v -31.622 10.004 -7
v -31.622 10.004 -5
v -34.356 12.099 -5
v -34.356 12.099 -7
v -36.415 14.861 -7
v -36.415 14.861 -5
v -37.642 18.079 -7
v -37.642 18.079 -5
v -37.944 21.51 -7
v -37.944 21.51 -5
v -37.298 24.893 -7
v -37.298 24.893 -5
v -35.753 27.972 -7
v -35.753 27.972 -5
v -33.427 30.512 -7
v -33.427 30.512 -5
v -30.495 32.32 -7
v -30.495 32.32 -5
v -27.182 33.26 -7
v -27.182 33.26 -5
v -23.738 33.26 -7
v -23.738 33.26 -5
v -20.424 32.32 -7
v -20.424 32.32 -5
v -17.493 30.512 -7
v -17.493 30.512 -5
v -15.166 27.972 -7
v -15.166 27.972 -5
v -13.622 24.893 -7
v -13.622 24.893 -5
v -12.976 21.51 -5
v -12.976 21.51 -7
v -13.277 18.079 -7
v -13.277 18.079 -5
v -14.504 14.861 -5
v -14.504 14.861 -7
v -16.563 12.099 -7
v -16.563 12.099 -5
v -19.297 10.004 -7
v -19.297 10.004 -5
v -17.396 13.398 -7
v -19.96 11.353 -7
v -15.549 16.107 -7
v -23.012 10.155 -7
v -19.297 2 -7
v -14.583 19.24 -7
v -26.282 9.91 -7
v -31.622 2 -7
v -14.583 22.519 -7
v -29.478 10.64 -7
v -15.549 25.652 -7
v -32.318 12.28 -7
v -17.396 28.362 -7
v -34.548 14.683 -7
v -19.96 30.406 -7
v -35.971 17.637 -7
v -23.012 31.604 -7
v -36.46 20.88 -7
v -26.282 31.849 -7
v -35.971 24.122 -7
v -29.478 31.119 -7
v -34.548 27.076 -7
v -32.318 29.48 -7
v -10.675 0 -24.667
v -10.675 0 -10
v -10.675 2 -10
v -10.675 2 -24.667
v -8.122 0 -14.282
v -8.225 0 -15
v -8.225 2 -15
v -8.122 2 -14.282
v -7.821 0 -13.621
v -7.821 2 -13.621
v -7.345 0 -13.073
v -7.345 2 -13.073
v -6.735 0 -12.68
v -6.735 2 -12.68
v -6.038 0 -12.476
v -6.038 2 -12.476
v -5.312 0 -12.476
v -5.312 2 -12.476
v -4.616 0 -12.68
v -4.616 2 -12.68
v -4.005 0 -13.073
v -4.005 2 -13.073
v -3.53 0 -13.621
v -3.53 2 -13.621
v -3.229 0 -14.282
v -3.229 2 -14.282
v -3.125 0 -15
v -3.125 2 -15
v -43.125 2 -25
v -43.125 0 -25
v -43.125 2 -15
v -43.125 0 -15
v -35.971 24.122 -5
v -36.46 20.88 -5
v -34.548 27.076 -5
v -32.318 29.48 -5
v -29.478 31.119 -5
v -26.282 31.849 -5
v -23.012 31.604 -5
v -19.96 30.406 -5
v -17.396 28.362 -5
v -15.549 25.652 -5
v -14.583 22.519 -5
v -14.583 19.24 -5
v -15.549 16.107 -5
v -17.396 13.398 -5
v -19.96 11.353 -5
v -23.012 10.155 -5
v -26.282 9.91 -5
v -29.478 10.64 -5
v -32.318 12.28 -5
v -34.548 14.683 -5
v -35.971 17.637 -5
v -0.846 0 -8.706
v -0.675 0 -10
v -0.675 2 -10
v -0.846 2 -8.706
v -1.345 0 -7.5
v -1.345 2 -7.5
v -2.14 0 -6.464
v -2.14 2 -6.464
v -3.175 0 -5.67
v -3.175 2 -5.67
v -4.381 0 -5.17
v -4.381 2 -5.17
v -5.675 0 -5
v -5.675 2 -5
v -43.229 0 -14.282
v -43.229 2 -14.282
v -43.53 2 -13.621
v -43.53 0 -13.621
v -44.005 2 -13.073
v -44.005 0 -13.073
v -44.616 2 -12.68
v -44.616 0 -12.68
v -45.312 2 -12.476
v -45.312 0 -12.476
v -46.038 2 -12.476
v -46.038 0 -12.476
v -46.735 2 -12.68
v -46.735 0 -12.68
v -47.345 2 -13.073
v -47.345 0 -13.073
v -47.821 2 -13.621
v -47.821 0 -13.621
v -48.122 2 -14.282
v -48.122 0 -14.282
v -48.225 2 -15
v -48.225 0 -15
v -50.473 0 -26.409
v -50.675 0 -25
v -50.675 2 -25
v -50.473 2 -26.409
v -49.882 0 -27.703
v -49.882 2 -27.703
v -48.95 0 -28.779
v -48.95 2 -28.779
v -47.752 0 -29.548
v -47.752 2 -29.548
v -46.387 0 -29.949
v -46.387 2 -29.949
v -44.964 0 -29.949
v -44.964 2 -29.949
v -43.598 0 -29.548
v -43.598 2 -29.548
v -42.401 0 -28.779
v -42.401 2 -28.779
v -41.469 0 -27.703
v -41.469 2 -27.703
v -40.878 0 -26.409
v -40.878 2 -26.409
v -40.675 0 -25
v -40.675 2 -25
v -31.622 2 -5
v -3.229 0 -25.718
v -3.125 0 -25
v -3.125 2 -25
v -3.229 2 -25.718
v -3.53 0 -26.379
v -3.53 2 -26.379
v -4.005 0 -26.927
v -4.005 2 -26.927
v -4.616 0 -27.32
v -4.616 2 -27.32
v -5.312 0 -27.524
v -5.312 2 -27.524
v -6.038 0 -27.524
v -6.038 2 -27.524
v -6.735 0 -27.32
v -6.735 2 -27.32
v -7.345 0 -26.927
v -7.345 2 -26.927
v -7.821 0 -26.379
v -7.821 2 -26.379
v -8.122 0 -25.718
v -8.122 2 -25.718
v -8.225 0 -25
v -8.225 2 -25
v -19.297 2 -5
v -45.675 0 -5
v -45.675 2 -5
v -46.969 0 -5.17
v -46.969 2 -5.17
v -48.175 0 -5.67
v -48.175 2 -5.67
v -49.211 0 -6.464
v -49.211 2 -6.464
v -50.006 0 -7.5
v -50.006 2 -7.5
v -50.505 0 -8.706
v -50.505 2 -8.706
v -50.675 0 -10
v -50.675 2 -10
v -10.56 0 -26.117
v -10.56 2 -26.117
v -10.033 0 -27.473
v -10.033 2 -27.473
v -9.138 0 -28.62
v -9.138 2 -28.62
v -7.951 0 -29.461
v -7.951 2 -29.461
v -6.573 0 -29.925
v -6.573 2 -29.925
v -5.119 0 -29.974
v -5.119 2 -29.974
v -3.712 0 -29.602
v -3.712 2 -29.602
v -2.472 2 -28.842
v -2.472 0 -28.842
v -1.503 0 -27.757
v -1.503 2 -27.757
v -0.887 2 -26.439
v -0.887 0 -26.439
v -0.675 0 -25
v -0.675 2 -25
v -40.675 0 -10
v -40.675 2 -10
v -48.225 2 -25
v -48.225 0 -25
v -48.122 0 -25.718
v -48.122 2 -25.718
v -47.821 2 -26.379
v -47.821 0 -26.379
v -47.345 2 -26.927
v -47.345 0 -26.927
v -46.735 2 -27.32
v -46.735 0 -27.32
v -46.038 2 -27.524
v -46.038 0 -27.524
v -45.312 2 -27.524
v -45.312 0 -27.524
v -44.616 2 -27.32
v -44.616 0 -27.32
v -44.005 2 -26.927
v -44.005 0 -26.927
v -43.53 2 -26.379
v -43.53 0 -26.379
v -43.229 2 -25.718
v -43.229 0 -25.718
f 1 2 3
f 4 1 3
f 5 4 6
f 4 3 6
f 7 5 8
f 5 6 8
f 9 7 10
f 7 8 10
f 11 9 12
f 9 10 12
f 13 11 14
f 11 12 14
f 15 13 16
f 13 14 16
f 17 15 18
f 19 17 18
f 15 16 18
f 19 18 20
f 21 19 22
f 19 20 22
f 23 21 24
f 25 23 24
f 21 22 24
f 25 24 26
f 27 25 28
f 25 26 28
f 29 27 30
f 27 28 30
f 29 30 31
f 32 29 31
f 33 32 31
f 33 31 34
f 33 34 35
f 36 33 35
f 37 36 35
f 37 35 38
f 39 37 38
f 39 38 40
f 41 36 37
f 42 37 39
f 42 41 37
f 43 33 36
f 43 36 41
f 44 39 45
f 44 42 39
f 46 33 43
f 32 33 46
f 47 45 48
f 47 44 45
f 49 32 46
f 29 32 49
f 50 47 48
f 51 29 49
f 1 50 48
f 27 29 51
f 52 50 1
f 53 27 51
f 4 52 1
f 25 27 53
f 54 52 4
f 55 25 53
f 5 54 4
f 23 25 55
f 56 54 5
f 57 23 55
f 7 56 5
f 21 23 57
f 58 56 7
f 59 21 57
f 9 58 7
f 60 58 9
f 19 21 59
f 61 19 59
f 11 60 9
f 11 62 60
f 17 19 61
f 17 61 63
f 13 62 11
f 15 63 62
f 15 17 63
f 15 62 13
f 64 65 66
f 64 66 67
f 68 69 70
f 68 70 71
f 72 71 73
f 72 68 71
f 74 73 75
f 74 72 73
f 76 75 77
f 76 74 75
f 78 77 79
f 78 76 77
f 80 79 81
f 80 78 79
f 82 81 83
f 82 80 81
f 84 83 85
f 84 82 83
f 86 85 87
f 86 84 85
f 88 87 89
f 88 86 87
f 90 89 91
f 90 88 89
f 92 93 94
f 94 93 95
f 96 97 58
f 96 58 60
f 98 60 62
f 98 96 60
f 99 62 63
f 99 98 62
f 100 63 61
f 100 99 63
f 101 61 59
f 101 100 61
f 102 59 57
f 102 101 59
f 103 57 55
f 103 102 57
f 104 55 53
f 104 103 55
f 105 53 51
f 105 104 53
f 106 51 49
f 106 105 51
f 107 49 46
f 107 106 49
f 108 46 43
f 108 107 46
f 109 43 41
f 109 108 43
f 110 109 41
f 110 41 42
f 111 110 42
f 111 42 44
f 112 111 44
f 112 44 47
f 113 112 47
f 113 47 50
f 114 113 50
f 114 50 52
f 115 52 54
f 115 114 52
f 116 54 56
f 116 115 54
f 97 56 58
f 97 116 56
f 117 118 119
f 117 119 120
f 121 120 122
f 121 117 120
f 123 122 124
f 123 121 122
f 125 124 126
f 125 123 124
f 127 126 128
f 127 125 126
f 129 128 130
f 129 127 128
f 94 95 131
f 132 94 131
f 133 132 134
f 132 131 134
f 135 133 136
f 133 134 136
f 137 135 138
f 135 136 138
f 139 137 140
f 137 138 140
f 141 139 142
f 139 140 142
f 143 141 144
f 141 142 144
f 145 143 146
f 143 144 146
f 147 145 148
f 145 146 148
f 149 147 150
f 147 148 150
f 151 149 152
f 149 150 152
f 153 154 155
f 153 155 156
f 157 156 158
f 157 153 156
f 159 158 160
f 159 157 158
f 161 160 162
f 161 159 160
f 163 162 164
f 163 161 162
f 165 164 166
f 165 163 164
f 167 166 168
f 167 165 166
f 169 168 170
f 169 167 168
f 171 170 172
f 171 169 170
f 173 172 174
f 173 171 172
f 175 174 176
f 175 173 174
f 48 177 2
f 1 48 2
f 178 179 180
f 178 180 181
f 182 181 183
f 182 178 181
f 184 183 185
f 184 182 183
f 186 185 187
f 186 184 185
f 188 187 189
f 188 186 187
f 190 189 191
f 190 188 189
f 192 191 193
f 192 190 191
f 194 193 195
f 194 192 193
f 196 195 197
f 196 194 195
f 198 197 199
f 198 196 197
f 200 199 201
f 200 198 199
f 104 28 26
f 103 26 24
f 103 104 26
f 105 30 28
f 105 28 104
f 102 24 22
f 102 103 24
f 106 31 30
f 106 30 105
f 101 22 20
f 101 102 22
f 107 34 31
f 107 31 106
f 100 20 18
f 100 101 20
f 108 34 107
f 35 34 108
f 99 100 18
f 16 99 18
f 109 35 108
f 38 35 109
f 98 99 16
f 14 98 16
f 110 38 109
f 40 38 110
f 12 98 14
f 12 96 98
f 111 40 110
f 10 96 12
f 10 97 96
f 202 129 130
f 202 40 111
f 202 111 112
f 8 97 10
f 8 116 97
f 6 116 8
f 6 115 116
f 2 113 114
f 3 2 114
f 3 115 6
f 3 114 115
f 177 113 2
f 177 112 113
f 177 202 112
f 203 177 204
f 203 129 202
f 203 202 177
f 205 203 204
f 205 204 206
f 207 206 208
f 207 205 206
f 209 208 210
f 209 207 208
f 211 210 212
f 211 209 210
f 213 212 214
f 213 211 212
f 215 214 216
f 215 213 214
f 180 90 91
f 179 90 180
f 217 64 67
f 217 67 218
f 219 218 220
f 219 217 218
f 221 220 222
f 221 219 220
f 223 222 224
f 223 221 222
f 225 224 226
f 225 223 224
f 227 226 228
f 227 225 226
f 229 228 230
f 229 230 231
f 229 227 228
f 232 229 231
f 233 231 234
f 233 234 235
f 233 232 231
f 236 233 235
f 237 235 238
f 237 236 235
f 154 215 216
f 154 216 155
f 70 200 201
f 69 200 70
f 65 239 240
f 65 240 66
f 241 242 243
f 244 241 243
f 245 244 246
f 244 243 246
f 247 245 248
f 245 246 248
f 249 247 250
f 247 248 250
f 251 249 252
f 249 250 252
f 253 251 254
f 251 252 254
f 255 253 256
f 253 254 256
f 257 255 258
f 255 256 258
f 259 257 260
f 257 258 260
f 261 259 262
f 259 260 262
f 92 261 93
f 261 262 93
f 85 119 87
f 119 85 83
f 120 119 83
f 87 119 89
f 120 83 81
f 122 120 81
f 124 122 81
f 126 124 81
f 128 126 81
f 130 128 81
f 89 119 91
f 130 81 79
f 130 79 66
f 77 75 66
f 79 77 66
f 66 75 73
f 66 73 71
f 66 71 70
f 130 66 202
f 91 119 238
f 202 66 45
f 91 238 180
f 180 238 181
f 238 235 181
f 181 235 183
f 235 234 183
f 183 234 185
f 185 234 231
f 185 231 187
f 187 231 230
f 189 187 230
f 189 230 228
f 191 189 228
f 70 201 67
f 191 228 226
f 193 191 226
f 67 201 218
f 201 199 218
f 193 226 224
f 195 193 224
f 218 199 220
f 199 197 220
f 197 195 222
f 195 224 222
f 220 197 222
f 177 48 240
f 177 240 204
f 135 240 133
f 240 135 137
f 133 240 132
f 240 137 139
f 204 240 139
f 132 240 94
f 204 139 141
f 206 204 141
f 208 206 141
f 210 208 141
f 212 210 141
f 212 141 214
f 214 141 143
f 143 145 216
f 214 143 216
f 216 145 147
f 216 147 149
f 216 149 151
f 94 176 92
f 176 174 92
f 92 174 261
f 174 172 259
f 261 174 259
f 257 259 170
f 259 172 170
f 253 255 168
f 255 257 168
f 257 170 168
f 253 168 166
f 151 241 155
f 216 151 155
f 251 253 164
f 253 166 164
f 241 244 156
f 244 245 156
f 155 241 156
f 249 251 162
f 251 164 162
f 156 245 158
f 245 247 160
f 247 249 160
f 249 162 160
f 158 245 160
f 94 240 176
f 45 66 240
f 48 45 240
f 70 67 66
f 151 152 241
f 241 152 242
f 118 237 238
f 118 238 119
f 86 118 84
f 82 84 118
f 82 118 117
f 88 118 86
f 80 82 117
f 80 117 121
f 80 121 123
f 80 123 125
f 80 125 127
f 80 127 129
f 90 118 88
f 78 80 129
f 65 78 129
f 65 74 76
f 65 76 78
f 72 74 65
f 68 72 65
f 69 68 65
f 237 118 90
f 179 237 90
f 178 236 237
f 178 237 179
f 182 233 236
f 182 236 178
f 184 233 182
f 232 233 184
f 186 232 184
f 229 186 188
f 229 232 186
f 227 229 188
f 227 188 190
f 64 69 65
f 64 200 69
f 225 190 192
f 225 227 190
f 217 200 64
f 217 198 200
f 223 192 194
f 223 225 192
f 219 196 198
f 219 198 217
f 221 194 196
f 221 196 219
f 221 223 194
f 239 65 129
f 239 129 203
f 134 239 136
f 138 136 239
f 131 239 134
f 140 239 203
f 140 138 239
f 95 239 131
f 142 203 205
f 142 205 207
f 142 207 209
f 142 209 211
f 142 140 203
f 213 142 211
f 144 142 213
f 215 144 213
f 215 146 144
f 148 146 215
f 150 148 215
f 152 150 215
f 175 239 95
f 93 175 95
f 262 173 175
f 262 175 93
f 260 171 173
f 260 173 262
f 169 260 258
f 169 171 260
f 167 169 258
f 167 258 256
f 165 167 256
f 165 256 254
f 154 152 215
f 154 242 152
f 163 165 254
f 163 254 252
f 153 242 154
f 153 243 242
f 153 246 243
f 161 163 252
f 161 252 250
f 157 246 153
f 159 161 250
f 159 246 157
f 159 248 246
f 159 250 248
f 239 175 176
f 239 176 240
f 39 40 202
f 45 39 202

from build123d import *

# Parameters (mm, degrees)
BOSS_EXTRUDE1_DEPTH = 2
SKETCH2_R           = 11
BOSS_EXTRUDE3_DEPTH = 2


with BuildPart() as part:
    # Sketch1 → Boss-Extrude1 (new body)
    with BuildSketch(Plane(origin=(0, 0, 0), x_dir=(1, 0, 0), z_dir=(0, 1, 0))):
        with BuildLine():
            Line((-50.675392178, 10), (-50.675392178, 25))
            ThreePointArc((-50.675392178, 25), (-45.675392178, 30), (-40.675392178, 25))
            Line((-40.675392178, 25), (-40.675392178, 10))
            Line((-40.675392178, 10), (-10.675392178, 10))
            Line((-10.675392178, 10), (-10.675392178, 24.667030171))
            ThreePointArc((-10.675392178, 24.667030171), (-5.847512802, 30.002770955), (-0.675392178, 25))
            Line((-0.675392178, 25), (-0.675392178, 10))
            ThreePointArc((-0.675392178, 10), (-2.139858272, 6.464466094), (-5.675392178, 5))
            Line((-5.675392178, 5), (-45.675392178, 5))
            ThreePointArc((-45.675392178, 5), (-49.210926084, 6.464466094), (-50.675392178, 10))
        make_face()
        with BuildLine():
            Line((-43.125392178, 25), (-43.125392178, 15))
            ThreePointArc((-43.125392178, 15), (-45.675392178, 12.45), (-48.225392178, 15))
            Line((-48.225392178, 15), (-48.225392178, 25))
            ThreePointArc((-48.225392178, 25), (-45.675392178, 27.55), (-43.125392178, 25))
        make_face(mode=Mode.SUBTRACT)
        with BuildLine():
            Line((-8.225392178, 25), (-8.225392178, 15))
            ThreePointArc((-8.225392178, 15), (-5.675392178, 12.45), (-3.125392178, 15))
            Line((-3.125392178, 15), (-3.125392178, 25))
            ThreePointArc((-3.125392178, 25), (-5.675392178, 27.55), (-8.225392178, 25))
        make_face(mode=Mode.SUBTRACT)
    extrude(amount=BOSS_EXTRUDE1_DEPTH)

    # Sketch2 → Boss-Extrude3 (add)
    with BuildSketch(Plane(origin=(0, 0, -5), x_dir=(-1, 0, 0), z_dir=(0, 0, -1))):
        with BuildLine():
            Line((19.297037413, 10.004378208), (19.297037413, 2))
            Line((19.297037413, 2), (31.622351713, 2))
            Line((31.622351713, 2), (31.622351713, 10.004378208))
            ThreePointArc((31.622351713, 10.004378208), (25.459694563, 33.379655531), (19.297037413, 10.004378208))
        make_face()
        with Locations((25.459694563, 20.879655531)):
            Circle(SKETCH2_R, mode=Mode.SUBTRACT)
    extrude(amount=BOSS_EXTRUDE3_DEPTH)


solid = part.part
